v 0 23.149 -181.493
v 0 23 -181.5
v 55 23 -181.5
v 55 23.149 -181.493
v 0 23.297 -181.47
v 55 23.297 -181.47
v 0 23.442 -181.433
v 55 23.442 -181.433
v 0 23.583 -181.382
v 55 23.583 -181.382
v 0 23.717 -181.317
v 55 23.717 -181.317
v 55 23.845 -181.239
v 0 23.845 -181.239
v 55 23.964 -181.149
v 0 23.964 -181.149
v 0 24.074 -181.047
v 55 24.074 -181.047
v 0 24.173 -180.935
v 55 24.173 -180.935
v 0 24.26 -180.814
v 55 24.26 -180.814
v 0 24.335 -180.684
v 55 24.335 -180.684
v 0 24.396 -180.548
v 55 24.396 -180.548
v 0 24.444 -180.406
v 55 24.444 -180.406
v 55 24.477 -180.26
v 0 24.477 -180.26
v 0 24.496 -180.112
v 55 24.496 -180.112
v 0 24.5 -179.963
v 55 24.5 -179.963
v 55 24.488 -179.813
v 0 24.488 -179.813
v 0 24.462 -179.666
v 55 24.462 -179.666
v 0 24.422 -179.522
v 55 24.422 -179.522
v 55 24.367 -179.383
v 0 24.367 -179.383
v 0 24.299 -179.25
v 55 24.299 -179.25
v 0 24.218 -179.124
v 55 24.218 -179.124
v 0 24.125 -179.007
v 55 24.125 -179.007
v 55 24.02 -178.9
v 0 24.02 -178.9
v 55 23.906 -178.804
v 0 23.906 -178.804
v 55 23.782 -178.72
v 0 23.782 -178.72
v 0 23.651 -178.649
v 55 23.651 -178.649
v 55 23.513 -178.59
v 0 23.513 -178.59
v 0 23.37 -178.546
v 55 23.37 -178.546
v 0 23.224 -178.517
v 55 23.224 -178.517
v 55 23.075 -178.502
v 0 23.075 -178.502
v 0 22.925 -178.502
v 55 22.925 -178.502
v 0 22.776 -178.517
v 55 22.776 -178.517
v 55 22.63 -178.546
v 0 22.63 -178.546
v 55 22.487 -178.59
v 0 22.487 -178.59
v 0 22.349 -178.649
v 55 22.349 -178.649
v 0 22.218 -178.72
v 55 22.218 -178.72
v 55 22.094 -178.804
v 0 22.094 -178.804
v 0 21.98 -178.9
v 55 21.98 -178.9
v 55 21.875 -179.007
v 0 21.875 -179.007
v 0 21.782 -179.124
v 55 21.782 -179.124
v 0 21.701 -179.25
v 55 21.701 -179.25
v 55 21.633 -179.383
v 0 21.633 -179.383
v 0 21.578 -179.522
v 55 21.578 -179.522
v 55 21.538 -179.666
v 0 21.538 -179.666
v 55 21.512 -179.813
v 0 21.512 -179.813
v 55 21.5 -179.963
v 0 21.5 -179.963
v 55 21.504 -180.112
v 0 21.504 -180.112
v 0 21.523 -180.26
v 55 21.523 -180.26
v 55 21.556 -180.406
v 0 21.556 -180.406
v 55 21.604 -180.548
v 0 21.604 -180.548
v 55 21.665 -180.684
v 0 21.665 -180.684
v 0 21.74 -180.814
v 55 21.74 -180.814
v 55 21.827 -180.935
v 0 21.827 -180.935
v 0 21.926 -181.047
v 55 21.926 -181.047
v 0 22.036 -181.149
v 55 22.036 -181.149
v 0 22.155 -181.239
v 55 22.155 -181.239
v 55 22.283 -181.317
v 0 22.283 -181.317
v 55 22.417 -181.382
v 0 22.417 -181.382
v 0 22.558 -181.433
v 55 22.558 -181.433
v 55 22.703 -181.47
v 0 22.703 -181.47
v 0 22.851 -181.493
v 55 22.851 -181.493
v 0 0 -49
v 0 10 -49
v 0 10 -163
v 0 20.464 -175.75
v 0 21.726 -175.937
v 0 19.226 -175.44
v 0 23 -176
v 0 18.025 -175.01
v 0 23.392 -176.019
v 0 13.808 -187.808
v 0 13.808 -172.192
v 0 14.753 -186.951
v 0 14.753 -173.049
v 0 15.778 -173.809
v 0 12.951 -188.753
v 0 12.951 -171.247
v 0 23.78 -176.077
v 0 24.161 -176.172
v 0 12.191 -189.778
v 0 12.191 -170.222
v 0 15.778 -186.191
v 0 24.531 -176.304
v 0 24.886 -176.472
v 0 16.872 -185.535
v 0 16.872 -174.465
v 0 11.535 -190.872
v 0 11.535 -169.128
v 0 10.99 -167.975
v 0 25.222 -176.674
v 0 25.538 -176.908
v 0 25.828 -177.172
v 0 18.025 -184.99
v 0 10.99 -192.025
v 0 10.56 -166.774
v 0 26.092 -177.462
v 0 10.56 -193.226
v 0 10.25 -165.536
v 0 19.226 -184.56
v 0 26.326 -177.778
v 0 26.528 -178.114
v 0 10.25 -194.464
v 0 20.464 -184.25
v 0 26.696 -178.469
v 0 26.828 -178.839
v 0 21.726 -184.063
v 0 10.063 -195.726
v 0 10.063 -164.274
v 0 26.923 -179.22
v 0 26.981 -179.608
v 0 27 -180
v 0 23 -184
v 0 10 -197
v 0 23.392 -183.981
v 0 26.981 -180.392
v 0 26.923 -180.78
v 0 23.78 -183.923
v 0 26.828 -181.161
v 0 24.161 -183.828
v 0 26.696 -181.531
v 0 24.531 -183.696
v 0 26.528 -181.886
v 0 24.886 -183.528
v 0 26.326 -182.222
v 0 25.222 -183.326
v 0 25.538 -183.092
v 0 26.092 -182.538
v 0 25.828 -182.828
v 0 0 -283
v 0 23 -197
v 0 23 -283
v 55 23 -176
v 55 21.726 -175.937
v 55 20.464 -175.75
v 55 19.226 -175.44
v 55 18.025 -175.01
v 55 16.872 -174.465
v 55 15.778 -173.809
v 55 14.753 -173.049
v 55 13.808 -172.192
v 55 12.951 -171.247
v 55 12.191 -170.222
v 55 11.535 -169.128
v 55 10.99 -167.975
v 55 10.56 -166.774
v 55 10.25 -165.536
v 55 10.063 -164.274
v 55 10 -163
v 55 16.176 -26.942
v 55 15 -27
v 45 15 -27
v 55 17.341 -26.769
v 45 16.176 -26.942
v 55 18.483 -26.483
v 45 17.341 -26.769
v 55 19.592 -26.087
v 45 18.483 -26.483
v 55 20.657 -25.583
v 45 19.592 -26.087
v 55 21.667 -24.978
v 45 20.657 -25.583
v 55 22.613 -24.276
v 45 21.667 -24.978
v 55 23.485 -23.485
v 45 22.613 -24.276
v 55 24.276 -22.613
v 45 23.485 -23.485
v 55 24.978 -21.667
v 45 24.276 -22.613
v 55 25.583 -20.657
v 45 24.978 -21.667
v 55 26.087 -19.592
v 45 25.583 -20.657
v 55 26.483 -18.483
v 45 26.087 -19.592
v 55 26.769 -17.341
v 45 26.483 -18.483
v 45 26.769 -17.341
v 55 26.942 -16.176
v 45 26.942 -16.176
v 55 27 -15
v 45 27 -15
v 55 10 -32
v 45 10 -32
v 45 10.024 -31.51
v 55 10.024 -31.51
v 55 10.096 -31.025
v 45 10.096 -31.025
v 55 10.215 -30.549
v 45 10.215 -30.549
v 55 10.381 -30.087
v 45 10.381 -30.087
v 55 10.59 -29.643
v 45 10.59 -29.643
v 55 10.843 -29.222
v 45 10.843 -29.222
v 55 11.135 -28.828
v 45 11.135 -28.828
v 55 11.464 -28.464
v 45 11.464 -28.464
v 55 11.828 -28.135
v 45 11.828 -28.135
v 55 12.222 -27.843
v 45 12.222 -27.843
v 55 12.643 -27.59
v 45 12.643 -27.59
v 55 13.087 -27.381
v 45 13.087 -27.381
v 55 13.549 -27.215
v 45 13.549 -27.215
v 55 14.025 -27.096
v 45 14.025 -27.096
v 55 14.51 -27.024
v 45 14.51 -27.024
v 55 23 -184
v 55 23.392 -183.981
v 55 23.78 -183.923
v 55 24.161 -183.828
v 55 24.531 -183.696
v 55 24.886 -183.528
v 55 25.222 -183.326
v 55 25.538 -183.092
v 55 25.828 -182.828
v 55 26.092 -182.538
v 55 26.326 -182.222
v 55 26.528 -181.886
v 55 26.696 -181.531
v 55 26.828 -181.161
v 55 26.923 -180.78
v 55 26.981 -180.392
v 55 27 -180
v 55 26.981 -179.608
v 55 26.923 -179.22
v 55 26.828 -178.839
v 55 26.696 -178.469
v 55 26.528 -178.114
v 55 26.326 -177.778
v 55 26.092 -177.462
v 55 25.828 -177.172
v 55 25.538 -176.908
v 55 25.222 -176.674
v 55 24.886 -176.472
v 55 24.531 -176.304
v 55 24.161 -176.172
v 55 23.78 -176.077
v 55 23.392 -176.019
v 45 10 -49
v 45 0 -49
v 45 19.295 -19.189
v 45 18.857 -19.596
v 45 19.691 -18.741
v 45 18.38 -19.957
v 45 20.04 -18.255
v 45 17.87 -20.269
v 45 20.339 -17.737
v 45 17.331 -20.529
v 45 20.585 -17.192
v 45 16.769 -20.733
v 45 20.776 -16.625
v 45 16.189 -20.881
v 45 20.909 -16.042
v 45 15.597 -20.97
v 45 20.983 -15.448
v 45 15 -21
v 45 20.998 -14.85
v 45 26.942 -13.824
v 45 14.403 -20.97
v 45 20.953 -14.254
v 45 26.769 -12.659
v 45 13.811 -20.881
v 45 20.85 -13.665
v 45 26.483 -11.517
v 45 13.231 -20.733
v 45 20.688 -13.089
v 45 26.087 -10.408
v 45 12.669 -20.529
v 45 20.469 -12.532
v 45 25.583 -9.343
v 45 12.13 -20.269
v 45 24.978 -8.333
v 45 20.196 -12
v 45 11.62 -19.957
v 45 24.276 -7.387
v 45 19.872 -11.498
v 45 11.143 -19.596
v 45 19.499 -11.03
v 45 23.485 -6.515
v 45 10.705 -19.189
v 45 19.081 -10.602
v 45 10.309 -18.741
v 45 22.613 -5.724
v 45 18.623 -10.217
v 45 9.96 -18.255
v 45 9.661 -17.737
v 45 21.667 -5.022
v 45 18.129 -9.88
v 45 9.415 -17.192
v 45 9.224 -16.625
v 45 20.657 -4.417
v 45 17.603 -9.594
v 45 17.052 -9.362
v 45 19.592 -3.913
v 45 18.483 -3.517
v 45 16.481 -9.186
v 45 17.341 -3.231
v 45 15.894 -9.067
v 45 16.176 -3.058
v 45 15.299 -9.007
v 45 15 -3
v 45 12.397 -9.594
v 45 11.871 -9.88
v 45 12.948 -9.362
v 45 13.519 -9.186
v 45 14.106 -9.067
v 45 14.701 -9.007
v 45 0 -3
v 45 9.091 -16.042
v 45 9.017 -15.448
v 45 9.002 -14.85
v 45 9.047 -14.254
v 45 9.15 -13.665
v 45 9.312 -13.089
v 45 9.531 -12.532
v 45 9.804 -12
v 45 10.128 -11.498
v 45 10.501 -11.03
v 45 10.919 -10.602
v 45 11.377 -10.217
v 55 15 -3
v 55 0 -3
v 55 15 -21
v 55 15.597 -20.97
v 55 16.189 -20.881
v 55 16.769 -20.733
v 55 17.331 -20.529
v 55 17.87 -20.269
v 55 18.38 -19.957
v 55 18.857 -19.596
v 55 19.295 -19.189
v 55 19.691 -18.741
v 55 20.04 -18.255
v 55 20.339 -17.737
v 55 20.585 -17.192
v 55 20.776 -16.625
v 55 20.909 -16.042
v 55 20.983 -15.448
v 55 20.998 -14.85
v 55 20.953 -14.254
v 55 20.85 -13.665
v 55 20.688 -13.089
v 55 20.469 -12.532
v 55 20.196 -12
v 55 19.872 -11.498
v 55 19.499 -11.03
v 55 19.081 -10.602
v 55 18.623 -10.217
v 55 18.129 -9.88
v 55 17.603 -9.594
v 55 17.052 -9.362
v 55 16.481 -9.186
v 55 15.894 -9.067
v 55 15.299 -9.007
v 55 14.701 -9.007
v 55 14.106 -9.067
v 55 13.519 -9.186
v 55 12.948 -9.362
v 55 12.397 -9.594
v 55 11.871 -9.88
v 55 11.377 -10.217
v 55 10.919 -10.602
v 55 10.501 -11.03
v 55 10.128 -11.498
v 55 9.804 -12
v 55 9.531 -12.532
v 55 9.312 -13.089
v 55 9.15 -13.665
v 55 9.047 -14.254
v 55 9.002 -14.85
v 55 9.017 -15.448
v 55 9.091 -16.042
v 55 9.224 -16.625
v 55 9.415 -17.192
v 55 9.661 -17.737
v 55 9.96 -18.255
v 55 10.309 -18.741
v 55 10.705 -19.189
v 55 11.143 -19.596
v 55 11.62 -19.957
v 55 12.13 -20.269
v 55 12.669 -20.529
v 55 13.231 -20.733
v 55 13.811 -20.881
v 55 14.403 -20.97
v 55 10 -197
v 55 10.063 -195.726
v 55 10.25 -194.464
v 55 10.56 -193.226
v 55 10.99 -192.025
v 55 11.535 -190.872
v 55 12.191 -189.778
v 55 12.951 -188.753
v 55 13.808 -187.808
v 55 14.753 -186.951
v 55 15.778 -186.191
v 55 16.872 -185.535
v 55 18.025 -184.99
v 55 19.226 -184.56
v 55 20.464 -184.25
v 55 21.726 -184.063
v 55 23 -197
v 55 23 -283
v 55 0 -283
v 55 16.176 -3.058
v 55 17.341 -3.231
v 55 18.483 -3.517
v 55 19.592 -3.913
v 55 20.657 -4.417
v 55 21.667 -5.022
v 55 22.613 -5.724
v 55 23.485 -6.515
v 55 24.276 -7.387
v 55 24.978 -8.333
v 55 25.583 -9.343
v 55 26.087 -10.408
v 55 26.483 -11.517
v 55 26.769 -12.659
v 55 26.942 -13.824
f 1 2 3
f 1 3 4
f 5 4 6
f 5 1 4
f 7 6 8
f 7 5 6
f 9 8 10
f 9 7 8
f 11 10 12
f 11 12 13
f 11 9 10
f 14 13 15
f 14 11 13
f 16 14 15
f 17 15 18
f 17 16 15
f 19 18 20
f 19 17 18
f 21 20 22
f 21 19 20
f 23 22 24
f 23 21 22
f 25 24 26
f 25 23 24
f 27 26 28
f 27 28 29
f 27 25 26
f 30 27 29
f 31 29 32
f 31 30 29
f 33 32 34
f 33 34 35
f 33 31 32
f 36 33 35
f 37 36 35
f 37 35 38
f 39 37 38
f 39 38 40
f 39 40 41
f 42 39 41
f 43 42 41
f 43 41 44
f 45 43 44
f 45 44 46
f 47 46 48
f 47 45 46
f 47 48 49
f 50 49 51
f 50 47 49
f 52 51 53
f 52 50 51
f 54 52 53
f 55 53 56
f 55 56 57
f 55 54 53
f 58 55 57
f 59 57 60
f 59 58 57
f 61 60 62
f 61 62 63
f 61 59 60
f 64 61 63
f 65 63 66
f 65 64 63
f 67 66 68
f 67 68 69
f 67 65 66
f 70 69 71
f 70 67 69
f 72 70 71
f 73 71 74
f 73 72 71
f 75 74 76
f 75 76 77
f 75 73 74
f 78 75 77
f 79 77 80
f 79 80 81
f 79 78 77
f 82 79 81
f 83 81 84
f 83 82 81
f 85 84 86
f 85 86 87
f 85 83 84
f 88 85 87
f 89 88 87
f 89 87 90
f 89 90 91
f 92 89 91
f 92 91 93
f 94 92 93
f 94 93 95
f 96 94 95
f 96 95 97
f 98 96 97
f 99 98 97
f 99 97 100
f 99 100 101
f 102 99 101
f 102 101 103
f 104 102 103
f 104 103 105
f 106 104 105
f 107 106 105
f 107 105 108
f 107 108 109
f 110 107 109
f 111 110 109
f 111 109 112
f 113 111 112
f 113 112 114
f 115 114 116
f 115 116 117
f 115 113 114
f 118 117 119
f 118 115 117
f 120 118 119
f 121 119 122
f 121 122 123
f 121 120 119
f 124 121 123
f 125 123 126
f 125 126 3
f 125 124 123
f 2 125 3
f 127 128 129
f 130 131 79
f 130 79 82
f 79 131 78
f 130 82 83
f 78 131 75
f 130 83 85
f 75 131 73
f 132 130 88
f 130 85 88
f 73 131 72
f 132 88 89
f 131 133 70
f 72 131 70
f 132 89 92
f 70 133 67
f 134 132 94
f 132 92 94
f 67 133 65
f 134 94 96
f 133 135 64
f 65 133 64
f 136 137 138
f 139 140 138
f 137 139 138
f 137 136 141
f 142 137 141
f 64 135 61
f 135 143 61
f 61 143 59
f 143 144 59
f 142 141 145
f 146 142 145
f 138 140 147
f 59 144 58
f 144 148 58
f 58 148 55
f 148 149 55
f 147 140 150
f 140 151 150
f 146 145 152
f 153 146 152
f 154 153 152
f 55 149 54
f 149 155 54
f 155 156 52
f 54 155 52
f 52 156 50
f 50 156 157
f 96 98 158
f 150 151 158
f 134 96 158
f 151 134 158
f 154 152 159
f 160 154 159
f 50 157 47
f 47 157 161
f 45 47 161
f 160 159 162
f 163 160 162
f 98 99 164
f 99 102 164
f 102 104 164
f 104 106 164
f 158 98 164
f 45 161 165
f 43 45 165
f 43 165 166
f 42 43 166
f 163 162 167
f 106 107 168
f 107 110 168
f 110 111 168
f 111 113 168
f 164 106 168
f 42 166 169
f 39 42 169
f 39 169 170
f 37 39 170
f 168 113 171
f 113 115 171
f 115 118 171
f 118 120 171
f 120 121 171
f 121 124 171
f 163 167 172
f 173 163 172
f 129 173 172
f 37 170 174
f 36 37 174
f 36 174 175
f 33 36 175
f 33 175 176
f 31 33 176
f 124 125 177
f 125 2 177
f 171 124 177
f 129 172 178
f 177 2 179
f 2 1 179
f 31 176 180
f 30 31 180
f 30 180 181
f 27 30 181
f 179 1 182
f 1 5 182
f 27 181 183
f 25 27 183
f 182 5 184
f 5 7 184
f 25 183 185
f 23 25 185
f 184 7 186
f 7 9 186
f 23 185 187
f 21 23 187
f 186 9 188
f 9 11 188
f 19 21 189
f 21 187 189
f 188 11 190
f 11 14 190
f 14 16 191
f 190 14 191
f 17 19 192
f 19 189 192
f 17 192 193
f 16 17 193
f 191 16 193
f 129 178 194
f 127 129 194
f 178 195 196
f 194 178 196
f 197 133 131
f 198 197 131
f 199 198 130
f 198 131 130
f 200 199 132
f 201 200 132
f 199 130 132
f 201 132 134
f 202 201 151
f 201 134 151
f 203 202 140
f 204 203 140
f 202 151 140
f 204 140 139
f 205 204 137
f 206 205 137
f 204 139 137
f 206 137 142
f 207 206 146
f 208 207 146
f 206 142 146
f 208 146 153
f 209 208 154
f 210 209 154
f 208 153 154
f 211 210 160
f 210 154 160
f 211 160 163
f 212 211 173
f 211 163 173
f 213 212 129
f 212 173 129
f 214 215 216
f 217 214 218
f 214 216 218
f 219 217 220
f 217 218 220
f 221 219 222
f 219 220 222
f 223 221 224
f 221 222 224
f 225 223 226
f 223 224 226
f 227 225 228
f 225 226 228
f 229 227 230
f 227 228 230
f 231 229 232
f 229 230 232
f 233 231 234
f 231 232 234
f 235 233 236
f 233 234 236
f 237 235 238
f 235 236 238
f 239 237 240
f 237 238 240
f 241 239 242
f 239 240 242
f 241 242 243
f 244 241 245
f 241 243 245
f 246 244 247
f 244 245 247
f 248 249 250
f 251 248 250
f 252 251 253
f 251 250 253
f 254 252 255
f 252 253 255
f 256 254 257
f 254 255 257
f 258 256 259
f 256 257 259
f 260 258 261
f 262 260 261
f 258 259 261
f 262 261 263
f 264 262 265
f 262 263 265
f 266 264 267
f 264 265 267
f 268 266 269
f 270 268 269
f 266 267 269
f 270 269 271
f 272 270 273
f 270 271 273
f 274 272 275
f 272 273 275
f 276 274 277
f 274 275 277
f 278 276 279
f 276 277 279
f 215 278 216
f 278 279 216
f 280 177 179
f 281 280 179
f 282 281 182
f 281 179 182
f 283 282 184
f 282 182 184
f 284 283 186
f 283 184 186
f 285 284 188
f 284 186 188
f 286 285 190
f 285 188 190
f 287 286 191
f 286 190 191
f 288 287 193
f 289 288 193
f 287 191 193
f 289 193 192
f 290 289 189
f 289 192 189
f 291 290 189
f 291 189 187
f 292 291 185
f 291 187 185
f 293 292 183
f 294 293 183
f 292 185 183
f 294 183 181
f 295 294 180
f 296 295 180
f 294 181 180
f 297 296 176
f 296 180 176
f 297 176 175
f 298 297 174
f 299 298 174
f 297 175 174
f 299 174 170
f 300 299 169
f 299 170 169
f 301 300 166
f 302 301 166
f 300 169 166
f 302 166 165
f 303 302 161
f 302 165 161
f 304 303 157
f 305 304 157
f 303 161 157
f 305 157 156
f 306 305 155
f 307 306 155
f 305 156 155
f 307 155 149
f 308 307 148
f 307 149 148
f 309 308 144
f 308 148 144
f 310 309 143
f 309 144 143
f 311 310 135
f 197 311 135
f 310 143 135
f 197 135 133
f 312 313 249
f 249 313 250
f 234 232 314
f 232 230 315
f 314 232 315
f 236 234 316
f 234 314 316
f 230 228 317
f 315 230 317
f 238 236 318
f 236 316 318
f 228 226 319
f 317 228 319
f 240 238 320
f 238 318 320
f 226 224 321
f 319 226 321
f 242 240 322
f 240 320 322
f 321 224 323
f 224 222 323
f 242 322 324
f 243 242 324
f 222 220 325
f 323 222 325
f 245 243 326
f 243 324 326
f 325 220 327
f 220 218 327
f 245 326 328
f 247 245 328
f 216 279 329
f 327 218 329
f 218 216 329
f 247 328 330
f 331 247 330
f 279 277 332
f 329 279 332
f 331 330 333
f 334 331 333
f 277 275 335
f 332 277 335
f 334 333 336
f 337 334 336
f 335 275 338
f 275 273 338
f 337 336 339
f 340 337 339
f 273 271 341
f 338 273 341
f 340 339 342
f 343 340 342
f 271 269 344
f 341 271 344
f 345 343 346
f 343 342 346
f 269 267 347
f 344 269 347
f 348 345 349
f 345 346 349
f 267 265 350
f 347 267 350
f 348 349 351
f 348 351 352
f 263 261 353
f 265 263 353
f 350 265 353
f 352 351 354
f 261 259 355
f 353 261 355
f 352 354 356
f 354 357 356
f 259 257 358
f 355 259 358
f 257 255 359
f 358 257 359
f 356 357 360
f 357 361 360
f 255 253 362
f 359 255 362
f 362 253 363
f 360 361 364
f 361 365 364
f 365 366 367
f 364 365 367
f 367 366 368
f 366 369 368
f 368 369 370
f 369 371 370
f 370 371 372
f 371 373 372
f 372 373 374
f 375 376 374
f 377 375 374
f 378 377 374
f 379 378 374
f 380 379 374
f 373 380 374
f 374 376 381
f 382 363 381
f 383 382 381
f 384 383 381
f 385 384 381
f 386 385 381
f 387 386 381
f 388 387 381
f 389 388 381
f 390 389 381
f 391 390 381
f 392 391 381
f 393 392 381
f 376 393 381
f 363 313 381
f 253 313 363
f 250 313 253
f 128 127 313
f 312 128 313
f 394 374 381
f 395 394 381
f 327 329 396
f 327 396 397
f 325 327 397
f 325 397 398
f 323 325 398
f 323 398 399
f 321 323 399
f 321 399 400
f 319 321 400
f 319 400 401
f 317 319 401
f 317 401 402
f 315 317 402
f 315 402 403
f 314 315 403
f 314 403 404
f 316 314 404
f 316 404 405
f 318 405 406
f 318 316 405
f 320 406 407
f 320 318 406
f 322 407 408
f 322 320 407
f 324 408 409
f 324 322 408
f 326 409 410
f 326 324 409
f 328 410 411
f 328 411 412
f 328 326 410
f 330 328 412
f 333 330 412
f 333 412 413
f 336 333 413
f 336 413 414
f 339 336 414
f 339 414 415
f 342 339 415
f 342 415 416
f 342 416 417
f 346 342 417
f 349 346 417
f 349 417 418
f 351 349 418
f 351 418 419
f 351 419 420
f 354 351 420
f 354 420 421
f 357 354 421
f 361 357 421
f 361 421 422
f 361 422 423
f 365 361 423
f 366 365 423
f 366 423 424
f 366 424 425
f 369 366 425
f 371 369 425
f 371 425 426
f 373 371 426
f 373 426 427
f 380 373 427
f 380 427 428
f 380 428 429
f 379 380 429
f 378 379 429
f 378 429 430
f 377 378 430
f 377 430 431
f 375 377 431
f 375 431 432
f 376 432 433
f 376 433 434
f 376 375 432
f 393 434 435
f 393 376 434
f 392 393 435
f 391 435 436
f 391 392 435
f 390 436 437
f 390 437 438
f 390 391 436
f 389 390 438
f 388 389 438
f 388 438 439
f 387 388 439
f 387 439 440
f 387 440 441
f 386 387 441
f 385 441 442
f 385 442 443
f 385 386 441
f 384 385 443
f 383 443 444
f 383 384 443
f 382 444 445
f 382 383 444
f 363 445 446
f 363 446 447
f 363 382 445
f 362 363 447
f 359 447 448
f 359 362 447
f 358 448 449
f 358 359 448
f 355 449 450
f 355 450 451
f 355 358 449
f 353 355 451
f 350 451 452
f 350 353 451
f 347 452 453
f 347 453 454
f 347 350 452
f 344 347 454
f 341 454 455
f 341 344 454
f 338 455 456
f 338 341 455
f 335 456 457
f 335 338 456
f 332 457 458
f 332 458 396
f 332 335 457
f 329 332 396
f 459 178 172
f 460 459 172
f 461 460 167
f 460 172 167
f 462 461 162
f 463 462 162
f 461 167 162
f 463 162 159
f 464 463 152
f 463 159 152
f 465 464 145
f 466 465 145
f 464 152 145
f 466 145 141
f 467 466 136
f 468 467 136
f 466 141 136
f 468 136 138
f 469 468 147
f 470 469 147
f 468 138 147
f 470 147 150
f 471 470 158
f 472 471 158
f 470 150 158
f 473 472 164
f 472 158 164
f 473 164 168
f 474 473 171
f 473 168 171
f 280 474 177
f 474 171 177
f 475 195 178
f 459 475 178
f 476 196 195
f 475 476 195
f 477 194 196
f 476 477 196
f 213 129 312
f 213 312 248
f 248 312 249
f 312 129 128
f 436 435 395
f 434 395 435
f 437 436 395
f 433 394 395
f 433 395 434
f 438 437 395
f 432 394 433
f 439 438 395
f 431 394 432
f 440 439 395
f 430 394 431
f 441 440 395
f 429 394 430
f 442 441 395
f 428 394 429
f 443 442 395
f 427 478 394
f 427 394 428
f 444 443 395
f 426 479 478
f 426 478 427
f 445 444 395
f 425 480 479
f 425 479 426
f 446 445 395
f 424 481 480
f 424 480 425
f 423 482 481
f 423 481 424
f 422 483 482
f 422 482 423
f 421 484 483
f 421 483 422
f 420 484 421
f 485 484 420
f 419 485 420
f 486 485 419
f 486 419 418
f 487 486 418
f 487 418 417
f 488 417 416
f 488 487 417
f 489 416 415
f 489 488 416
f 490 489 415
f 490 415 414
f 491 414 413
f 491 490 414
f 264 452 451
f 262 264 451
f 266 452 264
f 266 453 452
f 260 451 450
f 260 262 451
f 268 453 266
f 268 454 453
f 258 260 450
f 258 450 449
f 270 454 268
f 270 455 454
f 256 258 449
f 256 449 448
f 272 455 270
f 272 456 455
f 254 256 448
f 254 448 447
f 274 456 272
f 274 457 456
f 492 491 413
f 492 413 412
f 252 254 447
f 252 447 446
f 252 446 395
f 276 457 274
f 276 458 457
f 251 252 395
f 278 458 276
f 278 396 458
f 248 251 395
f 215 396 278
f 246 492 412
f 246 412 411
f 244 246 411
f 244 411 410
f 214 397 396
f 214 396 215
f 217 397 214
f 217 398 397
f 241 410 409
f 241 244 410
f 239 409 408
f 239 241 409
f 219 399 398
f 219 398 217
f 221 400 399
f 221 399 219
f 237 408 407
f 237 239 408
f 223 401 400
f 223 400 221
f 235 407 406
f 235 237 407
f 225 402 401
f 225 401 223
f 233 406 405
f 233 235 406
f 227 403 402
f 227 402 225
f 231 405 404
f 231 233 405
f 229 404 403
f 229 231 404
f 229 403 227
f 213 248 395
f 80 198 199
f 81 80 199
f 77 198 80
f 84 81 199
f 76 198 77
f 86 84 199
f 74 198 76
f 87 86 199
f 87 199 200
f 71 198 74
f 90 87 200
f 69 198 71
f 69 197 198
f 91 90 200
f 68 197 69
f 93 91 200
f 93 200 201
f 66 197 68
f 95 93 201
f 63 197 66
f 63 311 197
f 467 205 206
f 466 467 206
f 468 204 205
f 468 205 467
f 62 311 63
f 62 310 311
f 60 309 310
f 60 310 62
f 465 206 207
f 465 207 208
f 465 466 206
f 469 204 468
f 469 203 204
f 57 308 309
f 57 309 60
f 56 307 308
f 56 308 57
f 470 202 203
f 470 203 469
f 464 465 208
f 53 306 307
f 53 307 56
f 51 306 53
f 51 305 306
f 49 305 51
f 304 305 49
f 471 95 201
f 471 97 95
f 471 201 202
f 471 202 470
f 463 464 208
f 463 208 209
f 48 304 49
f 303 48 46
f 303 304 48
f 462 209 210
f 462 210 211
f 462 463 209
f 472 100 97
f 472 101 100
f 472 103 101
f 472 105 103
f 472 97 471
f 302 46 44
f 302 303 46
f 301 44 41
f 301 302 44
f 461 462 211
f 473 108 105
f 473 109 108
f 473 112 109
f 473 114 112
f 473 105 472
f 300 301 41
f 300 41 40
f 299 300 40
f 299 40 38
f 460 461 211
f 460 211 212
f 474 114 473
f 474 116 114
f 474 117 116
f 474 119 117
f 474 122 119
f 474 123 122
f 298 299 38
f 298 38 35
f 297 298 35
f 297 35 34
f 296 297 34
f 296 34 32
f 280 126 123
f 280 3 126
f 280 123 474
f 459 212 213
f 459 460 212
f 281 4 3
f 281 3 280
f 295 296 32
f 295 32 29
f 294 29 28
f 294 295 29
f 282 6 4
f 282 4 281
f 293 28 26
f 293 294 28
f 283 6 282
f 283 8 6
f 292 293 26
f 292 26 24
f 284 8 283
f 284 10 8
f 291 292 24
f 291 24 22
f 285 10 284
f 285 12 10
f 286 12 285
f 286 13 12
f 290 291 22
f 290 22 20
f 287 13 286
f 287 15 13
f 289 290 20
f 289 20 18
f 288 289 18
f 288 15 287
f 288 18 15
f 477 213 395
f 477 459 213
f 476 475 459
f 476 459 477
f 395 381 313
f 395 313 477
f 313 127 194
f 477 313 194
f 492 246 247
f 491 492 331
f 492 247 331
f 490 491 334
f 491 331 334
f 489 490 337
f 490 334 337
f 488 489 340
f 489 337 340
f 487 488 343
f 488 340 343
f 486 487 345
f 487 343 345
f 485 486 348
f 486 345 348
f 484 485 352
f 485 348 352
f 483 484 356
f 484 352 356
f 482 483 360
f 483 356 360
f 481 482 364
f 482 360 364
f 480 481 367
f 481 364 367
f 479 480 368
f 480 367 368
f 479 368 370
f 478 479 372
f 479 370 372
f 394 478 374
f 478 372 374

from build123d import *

# Parameters (mm, degrees)
SKETCH1_R           = 6
SKETCH1_R_2         = 1.5
BOSS_EXTRUDE1_DEPTH = 55
SKETCH2_W           = 45
SKETCH2_H           = 46
CUT_EXTRUDE1_DEPTH  = 290.556557515


with BuildPart() as part:
    # Sketch1 → Boss-Extrude1 (new body)
    with BuildSketch(Plane(origin=(0, 0, 0), x_dir=(0, 0, -1), z_dir=(1, 0, 0))):
        with BuildLine():
            Line((3, 15), (3, 0))
            Line((3, 0), (283, 0))
            Line((283, 0), (283, 23))
            Line((283, 23), (197, 23))
            Line((197, 23), (197, 10))
            ThreePointArc((197, 10), (187.807611845, 13.807611845), (184, 23))
            ThreePointArc((184, 23), (180, 27), (176, 23))
            ThreePointArc((176, 23), (172.192388155, 13.807611845), (163, 10))
            Line((163, 10), (32, 10))
            ThreePointArc((32, 10), (28.464466094, 11.464466094), (27, 15))
            ThreePointArc((27, 15), (23.485281374, 23.485281374), (15, 27))
            ThreePointArc((15, 27), (6.514718626, 23.485281374), (3, 15))
        make_face()
        with Locations((15, 15)):
            Circle(SKETCH1_R, mode=Mode.SUBTRACT)
        with Locations((180, 23)):
            Circle(SKETCH1_R_2, mode=Mode.SUBTRACT)
    extrude(amount=BOSS_EXTRUDE1_DEPTH)

    # Sketch2 → Cut-Extrude1 (cut, through all)
    with BuildSketch(Plane.XZ):
        with Locations((22.5, -26)):
            Rectangle(SKETCH2_W, SKETCH2_H)
    extrude(amount=-CUT_EXTRUDE1_DEPTH, mode=Mode.SUBTRACT)


solid = part.part
